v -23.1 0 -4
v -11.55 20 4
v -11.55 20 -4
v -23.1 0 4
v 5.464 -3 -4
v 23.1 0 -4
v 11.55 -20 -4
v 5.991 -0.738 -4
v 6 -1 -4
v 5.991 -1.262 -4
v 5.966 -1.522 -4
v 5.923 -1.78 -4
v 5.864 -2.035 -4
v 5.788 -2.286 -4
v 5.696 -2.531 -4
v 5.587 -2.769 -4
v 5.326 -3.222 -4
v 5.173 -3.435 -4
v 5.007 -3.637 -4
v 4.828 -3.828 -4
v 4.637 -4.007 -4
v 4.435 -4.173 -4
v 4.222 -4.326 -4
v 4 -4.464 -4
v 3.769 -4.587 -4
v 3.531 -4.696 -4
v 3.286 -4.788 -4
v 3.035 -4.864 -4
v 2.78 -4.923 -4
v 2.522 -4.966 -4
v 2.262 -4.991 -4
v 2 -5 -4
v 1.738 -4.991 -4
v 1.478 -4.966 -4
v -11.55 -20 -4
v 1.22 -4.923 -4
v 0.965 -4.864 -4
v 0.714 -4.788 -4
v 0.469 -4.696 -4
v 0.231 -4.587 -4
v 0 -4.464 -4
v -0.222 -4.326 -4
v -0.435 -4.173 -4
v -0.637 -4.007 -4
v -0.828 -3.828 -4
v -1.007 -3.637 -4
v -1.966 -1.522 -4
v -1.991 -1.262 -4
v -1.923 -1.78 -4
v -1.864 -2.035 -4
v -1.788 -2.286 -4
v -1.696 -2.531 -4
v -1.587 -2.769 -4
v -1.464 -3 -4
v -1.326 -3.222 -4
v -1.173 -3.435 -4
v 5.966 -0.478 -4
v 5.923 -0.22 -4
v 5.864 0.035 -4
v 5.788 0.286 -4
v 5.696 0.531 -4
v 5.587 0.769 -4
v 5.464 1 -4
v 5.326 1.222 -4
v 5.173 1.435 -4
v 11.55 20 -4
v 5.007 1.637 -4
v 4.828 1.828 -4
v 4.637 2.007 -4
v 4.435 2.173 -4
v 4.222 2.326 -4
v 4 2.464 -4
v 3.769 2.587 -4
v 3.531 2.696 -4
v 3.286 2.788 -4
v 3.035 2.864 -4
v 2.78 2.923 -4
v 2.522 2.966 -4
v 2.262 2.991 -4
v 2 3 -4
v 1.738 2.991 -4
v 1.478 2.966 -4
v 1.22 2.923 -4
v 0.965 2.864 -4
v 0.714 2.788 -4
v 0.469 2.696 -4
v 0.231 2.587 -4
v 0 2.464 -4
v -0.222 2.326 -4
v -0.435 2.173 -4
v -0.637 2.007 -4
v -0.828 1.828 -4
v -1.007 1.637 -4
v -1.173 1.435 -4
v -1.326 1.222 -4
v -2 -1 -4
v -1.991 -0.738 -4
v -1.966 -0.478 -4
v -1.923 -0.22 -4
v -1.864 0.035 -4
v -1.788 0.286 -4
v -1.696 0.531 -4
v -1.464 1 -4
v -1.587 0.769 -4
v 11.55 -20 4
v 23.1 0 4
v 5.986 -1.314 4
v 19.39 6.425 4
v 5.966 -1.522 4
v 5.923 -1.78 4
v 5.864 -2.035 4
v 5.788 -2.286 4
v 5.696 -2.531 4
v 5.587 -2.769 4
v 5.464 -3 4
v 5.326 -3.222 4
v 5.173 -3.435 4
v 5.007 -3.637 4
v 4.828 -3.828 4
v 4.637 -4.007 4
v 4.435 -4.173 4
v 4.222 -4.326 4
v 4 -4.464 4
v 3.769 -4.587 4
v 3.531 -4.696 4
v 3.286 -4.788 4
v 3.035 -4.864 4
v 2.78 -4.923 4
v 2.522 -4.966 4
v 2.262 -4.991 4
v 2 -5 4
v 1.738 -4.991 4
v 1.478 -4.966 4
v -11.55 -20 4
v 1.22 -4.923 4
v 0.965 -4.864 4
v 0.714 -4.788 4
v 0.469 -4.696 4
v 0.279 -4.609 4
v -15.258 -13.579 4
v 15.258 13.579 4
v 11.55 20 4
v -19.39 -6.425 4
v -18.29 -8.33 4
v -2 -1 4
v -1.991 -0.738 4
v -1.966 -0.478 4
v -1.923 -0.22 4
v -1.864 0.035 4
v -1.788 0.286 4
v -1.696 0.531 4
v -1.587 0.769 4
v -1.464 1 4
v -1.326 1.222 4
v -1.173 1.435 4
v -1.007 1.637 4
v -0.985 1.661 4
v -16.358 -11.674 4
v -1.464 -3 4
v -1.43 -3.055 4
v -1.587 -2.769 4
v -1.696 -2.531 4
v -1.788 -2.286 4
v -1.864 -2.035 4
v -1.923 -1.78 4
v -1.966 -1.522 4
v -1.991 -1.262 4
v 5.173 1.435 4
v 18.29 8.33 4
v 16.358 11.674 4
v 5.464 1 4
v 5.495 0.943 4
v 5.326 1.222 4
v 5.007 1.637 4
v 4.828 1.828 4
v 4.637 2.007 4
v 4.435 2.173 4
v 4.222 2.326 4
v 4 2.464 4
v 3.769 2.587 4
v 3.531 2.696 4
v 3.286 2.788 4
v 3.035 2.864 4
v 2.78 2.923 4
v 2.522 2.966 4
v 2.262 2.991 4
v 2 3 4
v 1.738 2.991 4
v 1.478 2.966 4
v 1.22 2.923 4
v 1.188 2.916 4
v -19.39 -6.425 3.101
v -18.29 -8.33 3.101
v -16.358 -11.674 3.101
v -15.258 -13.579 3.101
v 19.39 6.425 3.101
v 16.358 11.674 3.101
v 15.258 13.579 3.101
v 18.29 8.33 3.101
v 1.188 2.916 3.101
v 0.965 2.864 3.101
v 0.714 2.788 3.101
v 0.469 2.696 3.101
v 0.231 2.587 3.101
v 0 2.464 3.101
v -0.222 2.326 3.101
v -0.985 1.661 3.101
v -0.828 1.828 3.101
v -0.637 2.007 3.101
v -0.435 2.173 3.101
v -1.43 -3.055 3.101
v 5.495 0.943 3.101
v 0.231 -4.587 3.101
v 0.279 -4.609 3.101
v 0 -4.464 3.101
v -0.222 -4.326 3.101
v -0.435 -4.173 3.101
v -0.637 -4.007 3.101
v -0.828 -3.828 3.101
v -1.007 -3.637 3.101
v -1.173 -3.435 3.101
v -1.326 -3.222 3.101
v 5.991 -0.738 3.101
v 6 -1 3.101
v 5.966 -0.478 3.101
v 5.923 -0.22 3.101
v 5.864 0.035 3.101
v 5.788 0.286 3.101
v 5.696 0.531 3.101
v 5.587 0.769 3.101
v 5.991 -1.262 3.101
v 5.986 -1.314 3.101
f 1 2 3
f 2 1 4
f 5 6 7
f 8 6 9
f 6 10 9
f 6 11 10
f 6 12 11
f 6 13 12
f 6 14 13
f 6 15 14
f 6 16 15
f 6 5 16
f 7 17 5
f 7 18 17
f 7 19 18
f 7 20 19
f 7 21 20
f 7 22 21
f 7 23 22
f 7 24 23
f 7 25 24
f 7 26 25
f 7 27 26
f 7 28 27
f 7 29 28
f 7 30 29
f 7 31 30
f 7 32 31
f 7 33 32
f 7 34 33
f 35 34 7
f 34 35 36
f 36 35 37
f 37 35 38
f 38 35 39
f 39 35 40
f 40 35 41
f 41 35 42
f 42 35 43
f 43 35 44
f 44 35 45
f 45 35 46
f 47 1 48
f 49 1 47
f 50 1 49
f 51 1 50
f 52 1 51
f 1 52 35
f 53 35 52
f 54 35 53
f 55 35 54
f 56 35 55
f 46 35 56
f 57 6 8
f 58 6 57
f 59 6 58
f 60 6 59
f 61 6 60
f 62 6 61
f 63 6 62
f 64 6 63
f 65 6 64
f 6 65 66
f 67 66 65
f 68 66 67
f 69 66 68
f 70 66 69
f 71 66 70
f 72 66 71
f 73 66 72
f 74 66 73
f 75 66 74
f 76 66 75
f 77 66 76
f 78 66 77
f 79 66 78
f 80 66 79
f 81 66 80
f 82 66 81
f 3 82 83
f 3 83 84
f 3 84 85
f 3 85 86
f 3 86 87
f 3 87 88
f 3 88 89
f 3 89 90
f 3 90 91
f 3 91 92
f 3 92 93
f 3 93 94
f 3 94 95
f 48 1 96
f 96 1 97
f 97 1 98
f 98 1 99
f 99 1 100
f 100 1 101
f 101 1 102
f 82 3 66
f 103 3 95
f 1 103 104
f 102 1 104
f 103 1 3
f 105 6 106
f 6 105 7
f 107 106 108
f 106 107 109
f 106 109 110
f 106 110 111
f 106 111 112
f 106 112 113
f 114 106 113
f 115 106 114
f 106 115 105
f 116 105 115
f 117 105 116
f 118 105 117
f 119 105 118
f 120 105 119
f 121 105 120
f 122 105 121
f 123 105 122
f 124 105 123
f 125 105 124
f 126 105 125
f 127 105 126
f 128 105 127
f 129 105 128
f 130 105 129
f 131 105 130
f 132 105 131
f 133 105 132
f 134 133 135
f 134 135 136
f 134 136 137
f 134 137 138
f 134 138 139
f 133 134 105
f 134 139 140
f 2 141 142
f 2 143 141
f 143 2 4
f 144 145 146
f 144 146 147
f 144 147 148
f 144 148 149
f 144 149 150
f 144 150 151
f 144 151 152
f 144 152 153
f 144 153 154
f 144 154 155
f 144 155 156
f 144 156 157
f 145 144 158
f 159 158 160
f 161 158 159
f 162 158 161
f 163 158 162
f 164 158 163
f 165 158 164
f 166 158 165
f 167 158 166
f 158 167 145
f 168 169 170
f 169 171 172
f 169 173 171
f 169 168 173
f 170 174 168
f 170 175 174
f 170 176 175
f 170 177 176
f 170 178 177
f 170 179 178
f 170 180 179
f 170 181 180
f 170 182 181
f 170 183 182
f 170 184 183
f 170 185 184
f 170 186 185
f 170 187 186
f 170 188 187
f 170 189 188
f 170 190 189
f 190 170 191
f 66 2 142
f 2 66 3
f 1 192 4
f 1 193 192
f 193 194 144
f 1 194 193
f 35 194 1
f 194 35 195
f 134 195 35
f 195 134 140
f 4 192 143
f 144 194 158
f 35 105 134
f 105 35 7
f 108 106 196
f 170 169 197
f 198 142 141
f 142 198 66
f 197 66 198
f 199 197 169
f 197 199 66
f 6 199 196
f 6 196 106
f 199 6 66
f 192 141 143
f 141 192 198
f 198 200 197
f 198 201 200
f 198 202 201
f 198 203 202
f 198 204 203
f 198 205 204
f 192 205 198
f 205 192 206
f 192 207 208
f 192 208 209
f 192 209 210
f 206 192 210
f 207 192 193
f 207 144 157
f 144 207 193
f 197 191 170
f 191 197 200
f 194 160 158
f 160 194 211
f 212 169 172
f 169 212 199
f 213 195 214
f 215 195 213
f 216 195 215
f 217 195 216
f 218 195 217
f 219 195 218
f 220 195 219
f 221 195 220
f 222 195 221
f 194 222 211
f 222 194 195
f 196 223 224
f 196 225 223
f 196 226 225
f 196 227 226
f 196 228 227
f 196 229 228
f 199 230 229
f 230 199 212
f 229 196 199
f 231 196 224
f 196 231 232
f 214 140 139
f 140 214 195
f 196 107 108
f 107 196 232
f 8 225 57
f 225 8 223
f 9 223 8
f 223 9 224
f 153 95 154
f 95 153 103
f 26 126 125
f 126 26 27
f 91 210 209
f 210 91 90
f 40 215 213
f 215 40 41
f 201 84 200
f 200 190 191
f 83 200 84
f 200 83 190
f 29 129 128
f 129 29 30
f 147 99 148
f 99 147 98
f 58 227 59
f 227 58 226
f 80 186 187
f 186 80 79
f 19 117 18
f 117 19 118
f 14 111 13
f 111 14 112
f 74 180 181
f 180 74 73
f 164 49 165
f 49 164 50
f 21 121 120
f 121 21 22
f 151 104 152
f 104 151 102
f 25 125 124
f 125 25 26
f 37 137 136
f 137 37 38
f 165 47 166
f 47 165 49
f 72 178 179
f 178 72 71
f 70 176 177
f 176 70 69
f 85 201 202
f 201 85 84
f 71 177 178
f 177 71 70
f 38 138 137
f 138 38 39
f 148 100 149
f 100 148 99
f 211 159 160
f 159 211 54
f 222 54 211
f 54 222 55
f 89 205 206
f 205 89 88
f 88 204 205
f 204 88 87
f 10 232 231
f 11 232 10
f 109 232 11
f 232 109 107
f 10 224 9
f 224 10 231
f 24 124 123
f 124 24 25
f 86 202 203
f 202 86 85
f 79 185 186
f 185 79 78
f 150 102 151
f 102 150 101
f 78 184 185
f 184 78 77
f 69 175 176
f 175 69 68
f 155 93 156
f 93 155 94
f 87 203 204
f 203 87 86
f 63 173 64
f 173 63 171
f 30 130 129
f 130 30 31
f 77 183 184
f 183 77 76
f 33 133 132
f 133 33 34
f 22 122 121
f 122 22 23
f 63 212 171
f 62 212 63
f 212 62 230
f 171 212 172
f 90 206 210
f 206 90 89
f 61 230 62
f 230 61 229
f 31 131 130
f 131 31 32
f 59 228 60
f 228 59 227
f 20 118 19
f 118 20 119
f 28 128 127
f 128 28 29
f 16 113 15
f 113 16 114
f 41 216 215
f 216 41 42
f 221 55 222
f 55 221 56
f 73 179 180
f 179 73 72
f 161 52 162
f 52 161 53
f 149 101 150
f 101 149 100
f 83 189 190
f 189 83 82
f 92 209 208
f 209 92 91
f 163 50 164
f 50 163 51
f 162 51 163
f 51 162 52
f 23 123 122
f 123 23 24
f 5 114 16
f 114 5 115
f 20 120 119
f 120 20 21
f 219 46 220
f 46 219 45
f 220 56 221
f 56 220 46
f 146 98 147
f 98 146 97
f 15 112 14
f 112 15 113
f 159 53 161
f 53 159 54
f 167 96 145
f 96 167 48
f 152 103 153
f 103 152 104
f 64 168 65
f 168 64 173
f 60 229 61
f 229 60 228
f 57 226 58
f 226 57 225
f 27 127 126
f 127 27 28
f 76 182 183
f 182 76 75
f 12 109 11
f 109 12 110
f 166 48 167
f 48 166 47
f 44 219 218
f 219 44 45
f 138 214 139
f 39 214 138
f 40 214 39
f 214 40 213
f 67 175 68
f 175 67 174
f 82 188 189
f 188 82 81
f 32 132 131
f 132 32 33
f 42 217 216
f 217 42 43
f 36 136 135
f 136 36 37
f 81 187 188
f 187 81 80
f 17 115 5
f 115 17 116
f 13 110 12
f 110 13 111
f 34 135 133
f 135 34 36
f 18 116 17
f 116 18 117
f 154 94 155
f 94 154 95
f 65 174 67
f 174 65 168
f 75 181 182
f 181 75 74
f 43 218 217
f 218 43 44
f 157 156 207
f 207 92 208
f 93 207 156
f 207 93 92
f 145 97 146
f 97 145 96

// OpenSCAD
$fn=96;

plate_th = 8.0;
bbox_x = 46.2;
bbox_y = 40.0;

hole_d = 8.0;
hole_offset = [2.0, -1.0];

groove_w = 2.2;
groove_d = 0.9;
groove_len = 80;
groove_angle = 30;
groove_sep = 7.0;
groove_center = [0, 0];

module hex2d_flat_to_bbox(x, y){
    s = x/2;
    r = y/sqrt(3);
    scale([1, r/s]) circle(r=s, $fn=6);
}

module hex_prism(h){
    linear_extrude(height=h, center=true) hex2d_flat_to_bbox(bbox_x, bbox_y);
}

module perimeter_step_profile(){
    union(){
        hex_prism(plate_th);
        translate([0,0, plate_th/2 - 1.0/2]) linear_extrude(height=1.0, center=true)
            offset(delta=-1.2) hex2d_flat_to_bbox(bbox_x, bbox_y);
        translate([0,0,-plate_th/2 + 1.0/2]) linear_extrude(height=1.0, center=true)
            offset(delta=-0.8) hex2d_flat_to_bbox(bbox_x, bbox_y);
    }
}

module through_hole(){
    translate([hole_offset[0], hole_offset[1], 0])
        cylinder(d=hole_d, h=plate_th+2, center=true);
}

module groove_cut(pos=[0,0], ang=0){
    translate([pos[0], pos[1], plate_th/2 - groove_d/2 + 0.001])
        rotate([0,0,ang])
            cube([groove_len, groove_w, groove_d], center=true);
}

module grooves(){
    groove_cut([groove_center[0], groove_center[1] + groove_sep/2], groove_angle);
    groove_cut([groove_center[0], groove_center[1] - groove_sep/2], groove_angle);
}

difference(){
    perimeter_step_profile();
    through_hole();
    grooves();
}
